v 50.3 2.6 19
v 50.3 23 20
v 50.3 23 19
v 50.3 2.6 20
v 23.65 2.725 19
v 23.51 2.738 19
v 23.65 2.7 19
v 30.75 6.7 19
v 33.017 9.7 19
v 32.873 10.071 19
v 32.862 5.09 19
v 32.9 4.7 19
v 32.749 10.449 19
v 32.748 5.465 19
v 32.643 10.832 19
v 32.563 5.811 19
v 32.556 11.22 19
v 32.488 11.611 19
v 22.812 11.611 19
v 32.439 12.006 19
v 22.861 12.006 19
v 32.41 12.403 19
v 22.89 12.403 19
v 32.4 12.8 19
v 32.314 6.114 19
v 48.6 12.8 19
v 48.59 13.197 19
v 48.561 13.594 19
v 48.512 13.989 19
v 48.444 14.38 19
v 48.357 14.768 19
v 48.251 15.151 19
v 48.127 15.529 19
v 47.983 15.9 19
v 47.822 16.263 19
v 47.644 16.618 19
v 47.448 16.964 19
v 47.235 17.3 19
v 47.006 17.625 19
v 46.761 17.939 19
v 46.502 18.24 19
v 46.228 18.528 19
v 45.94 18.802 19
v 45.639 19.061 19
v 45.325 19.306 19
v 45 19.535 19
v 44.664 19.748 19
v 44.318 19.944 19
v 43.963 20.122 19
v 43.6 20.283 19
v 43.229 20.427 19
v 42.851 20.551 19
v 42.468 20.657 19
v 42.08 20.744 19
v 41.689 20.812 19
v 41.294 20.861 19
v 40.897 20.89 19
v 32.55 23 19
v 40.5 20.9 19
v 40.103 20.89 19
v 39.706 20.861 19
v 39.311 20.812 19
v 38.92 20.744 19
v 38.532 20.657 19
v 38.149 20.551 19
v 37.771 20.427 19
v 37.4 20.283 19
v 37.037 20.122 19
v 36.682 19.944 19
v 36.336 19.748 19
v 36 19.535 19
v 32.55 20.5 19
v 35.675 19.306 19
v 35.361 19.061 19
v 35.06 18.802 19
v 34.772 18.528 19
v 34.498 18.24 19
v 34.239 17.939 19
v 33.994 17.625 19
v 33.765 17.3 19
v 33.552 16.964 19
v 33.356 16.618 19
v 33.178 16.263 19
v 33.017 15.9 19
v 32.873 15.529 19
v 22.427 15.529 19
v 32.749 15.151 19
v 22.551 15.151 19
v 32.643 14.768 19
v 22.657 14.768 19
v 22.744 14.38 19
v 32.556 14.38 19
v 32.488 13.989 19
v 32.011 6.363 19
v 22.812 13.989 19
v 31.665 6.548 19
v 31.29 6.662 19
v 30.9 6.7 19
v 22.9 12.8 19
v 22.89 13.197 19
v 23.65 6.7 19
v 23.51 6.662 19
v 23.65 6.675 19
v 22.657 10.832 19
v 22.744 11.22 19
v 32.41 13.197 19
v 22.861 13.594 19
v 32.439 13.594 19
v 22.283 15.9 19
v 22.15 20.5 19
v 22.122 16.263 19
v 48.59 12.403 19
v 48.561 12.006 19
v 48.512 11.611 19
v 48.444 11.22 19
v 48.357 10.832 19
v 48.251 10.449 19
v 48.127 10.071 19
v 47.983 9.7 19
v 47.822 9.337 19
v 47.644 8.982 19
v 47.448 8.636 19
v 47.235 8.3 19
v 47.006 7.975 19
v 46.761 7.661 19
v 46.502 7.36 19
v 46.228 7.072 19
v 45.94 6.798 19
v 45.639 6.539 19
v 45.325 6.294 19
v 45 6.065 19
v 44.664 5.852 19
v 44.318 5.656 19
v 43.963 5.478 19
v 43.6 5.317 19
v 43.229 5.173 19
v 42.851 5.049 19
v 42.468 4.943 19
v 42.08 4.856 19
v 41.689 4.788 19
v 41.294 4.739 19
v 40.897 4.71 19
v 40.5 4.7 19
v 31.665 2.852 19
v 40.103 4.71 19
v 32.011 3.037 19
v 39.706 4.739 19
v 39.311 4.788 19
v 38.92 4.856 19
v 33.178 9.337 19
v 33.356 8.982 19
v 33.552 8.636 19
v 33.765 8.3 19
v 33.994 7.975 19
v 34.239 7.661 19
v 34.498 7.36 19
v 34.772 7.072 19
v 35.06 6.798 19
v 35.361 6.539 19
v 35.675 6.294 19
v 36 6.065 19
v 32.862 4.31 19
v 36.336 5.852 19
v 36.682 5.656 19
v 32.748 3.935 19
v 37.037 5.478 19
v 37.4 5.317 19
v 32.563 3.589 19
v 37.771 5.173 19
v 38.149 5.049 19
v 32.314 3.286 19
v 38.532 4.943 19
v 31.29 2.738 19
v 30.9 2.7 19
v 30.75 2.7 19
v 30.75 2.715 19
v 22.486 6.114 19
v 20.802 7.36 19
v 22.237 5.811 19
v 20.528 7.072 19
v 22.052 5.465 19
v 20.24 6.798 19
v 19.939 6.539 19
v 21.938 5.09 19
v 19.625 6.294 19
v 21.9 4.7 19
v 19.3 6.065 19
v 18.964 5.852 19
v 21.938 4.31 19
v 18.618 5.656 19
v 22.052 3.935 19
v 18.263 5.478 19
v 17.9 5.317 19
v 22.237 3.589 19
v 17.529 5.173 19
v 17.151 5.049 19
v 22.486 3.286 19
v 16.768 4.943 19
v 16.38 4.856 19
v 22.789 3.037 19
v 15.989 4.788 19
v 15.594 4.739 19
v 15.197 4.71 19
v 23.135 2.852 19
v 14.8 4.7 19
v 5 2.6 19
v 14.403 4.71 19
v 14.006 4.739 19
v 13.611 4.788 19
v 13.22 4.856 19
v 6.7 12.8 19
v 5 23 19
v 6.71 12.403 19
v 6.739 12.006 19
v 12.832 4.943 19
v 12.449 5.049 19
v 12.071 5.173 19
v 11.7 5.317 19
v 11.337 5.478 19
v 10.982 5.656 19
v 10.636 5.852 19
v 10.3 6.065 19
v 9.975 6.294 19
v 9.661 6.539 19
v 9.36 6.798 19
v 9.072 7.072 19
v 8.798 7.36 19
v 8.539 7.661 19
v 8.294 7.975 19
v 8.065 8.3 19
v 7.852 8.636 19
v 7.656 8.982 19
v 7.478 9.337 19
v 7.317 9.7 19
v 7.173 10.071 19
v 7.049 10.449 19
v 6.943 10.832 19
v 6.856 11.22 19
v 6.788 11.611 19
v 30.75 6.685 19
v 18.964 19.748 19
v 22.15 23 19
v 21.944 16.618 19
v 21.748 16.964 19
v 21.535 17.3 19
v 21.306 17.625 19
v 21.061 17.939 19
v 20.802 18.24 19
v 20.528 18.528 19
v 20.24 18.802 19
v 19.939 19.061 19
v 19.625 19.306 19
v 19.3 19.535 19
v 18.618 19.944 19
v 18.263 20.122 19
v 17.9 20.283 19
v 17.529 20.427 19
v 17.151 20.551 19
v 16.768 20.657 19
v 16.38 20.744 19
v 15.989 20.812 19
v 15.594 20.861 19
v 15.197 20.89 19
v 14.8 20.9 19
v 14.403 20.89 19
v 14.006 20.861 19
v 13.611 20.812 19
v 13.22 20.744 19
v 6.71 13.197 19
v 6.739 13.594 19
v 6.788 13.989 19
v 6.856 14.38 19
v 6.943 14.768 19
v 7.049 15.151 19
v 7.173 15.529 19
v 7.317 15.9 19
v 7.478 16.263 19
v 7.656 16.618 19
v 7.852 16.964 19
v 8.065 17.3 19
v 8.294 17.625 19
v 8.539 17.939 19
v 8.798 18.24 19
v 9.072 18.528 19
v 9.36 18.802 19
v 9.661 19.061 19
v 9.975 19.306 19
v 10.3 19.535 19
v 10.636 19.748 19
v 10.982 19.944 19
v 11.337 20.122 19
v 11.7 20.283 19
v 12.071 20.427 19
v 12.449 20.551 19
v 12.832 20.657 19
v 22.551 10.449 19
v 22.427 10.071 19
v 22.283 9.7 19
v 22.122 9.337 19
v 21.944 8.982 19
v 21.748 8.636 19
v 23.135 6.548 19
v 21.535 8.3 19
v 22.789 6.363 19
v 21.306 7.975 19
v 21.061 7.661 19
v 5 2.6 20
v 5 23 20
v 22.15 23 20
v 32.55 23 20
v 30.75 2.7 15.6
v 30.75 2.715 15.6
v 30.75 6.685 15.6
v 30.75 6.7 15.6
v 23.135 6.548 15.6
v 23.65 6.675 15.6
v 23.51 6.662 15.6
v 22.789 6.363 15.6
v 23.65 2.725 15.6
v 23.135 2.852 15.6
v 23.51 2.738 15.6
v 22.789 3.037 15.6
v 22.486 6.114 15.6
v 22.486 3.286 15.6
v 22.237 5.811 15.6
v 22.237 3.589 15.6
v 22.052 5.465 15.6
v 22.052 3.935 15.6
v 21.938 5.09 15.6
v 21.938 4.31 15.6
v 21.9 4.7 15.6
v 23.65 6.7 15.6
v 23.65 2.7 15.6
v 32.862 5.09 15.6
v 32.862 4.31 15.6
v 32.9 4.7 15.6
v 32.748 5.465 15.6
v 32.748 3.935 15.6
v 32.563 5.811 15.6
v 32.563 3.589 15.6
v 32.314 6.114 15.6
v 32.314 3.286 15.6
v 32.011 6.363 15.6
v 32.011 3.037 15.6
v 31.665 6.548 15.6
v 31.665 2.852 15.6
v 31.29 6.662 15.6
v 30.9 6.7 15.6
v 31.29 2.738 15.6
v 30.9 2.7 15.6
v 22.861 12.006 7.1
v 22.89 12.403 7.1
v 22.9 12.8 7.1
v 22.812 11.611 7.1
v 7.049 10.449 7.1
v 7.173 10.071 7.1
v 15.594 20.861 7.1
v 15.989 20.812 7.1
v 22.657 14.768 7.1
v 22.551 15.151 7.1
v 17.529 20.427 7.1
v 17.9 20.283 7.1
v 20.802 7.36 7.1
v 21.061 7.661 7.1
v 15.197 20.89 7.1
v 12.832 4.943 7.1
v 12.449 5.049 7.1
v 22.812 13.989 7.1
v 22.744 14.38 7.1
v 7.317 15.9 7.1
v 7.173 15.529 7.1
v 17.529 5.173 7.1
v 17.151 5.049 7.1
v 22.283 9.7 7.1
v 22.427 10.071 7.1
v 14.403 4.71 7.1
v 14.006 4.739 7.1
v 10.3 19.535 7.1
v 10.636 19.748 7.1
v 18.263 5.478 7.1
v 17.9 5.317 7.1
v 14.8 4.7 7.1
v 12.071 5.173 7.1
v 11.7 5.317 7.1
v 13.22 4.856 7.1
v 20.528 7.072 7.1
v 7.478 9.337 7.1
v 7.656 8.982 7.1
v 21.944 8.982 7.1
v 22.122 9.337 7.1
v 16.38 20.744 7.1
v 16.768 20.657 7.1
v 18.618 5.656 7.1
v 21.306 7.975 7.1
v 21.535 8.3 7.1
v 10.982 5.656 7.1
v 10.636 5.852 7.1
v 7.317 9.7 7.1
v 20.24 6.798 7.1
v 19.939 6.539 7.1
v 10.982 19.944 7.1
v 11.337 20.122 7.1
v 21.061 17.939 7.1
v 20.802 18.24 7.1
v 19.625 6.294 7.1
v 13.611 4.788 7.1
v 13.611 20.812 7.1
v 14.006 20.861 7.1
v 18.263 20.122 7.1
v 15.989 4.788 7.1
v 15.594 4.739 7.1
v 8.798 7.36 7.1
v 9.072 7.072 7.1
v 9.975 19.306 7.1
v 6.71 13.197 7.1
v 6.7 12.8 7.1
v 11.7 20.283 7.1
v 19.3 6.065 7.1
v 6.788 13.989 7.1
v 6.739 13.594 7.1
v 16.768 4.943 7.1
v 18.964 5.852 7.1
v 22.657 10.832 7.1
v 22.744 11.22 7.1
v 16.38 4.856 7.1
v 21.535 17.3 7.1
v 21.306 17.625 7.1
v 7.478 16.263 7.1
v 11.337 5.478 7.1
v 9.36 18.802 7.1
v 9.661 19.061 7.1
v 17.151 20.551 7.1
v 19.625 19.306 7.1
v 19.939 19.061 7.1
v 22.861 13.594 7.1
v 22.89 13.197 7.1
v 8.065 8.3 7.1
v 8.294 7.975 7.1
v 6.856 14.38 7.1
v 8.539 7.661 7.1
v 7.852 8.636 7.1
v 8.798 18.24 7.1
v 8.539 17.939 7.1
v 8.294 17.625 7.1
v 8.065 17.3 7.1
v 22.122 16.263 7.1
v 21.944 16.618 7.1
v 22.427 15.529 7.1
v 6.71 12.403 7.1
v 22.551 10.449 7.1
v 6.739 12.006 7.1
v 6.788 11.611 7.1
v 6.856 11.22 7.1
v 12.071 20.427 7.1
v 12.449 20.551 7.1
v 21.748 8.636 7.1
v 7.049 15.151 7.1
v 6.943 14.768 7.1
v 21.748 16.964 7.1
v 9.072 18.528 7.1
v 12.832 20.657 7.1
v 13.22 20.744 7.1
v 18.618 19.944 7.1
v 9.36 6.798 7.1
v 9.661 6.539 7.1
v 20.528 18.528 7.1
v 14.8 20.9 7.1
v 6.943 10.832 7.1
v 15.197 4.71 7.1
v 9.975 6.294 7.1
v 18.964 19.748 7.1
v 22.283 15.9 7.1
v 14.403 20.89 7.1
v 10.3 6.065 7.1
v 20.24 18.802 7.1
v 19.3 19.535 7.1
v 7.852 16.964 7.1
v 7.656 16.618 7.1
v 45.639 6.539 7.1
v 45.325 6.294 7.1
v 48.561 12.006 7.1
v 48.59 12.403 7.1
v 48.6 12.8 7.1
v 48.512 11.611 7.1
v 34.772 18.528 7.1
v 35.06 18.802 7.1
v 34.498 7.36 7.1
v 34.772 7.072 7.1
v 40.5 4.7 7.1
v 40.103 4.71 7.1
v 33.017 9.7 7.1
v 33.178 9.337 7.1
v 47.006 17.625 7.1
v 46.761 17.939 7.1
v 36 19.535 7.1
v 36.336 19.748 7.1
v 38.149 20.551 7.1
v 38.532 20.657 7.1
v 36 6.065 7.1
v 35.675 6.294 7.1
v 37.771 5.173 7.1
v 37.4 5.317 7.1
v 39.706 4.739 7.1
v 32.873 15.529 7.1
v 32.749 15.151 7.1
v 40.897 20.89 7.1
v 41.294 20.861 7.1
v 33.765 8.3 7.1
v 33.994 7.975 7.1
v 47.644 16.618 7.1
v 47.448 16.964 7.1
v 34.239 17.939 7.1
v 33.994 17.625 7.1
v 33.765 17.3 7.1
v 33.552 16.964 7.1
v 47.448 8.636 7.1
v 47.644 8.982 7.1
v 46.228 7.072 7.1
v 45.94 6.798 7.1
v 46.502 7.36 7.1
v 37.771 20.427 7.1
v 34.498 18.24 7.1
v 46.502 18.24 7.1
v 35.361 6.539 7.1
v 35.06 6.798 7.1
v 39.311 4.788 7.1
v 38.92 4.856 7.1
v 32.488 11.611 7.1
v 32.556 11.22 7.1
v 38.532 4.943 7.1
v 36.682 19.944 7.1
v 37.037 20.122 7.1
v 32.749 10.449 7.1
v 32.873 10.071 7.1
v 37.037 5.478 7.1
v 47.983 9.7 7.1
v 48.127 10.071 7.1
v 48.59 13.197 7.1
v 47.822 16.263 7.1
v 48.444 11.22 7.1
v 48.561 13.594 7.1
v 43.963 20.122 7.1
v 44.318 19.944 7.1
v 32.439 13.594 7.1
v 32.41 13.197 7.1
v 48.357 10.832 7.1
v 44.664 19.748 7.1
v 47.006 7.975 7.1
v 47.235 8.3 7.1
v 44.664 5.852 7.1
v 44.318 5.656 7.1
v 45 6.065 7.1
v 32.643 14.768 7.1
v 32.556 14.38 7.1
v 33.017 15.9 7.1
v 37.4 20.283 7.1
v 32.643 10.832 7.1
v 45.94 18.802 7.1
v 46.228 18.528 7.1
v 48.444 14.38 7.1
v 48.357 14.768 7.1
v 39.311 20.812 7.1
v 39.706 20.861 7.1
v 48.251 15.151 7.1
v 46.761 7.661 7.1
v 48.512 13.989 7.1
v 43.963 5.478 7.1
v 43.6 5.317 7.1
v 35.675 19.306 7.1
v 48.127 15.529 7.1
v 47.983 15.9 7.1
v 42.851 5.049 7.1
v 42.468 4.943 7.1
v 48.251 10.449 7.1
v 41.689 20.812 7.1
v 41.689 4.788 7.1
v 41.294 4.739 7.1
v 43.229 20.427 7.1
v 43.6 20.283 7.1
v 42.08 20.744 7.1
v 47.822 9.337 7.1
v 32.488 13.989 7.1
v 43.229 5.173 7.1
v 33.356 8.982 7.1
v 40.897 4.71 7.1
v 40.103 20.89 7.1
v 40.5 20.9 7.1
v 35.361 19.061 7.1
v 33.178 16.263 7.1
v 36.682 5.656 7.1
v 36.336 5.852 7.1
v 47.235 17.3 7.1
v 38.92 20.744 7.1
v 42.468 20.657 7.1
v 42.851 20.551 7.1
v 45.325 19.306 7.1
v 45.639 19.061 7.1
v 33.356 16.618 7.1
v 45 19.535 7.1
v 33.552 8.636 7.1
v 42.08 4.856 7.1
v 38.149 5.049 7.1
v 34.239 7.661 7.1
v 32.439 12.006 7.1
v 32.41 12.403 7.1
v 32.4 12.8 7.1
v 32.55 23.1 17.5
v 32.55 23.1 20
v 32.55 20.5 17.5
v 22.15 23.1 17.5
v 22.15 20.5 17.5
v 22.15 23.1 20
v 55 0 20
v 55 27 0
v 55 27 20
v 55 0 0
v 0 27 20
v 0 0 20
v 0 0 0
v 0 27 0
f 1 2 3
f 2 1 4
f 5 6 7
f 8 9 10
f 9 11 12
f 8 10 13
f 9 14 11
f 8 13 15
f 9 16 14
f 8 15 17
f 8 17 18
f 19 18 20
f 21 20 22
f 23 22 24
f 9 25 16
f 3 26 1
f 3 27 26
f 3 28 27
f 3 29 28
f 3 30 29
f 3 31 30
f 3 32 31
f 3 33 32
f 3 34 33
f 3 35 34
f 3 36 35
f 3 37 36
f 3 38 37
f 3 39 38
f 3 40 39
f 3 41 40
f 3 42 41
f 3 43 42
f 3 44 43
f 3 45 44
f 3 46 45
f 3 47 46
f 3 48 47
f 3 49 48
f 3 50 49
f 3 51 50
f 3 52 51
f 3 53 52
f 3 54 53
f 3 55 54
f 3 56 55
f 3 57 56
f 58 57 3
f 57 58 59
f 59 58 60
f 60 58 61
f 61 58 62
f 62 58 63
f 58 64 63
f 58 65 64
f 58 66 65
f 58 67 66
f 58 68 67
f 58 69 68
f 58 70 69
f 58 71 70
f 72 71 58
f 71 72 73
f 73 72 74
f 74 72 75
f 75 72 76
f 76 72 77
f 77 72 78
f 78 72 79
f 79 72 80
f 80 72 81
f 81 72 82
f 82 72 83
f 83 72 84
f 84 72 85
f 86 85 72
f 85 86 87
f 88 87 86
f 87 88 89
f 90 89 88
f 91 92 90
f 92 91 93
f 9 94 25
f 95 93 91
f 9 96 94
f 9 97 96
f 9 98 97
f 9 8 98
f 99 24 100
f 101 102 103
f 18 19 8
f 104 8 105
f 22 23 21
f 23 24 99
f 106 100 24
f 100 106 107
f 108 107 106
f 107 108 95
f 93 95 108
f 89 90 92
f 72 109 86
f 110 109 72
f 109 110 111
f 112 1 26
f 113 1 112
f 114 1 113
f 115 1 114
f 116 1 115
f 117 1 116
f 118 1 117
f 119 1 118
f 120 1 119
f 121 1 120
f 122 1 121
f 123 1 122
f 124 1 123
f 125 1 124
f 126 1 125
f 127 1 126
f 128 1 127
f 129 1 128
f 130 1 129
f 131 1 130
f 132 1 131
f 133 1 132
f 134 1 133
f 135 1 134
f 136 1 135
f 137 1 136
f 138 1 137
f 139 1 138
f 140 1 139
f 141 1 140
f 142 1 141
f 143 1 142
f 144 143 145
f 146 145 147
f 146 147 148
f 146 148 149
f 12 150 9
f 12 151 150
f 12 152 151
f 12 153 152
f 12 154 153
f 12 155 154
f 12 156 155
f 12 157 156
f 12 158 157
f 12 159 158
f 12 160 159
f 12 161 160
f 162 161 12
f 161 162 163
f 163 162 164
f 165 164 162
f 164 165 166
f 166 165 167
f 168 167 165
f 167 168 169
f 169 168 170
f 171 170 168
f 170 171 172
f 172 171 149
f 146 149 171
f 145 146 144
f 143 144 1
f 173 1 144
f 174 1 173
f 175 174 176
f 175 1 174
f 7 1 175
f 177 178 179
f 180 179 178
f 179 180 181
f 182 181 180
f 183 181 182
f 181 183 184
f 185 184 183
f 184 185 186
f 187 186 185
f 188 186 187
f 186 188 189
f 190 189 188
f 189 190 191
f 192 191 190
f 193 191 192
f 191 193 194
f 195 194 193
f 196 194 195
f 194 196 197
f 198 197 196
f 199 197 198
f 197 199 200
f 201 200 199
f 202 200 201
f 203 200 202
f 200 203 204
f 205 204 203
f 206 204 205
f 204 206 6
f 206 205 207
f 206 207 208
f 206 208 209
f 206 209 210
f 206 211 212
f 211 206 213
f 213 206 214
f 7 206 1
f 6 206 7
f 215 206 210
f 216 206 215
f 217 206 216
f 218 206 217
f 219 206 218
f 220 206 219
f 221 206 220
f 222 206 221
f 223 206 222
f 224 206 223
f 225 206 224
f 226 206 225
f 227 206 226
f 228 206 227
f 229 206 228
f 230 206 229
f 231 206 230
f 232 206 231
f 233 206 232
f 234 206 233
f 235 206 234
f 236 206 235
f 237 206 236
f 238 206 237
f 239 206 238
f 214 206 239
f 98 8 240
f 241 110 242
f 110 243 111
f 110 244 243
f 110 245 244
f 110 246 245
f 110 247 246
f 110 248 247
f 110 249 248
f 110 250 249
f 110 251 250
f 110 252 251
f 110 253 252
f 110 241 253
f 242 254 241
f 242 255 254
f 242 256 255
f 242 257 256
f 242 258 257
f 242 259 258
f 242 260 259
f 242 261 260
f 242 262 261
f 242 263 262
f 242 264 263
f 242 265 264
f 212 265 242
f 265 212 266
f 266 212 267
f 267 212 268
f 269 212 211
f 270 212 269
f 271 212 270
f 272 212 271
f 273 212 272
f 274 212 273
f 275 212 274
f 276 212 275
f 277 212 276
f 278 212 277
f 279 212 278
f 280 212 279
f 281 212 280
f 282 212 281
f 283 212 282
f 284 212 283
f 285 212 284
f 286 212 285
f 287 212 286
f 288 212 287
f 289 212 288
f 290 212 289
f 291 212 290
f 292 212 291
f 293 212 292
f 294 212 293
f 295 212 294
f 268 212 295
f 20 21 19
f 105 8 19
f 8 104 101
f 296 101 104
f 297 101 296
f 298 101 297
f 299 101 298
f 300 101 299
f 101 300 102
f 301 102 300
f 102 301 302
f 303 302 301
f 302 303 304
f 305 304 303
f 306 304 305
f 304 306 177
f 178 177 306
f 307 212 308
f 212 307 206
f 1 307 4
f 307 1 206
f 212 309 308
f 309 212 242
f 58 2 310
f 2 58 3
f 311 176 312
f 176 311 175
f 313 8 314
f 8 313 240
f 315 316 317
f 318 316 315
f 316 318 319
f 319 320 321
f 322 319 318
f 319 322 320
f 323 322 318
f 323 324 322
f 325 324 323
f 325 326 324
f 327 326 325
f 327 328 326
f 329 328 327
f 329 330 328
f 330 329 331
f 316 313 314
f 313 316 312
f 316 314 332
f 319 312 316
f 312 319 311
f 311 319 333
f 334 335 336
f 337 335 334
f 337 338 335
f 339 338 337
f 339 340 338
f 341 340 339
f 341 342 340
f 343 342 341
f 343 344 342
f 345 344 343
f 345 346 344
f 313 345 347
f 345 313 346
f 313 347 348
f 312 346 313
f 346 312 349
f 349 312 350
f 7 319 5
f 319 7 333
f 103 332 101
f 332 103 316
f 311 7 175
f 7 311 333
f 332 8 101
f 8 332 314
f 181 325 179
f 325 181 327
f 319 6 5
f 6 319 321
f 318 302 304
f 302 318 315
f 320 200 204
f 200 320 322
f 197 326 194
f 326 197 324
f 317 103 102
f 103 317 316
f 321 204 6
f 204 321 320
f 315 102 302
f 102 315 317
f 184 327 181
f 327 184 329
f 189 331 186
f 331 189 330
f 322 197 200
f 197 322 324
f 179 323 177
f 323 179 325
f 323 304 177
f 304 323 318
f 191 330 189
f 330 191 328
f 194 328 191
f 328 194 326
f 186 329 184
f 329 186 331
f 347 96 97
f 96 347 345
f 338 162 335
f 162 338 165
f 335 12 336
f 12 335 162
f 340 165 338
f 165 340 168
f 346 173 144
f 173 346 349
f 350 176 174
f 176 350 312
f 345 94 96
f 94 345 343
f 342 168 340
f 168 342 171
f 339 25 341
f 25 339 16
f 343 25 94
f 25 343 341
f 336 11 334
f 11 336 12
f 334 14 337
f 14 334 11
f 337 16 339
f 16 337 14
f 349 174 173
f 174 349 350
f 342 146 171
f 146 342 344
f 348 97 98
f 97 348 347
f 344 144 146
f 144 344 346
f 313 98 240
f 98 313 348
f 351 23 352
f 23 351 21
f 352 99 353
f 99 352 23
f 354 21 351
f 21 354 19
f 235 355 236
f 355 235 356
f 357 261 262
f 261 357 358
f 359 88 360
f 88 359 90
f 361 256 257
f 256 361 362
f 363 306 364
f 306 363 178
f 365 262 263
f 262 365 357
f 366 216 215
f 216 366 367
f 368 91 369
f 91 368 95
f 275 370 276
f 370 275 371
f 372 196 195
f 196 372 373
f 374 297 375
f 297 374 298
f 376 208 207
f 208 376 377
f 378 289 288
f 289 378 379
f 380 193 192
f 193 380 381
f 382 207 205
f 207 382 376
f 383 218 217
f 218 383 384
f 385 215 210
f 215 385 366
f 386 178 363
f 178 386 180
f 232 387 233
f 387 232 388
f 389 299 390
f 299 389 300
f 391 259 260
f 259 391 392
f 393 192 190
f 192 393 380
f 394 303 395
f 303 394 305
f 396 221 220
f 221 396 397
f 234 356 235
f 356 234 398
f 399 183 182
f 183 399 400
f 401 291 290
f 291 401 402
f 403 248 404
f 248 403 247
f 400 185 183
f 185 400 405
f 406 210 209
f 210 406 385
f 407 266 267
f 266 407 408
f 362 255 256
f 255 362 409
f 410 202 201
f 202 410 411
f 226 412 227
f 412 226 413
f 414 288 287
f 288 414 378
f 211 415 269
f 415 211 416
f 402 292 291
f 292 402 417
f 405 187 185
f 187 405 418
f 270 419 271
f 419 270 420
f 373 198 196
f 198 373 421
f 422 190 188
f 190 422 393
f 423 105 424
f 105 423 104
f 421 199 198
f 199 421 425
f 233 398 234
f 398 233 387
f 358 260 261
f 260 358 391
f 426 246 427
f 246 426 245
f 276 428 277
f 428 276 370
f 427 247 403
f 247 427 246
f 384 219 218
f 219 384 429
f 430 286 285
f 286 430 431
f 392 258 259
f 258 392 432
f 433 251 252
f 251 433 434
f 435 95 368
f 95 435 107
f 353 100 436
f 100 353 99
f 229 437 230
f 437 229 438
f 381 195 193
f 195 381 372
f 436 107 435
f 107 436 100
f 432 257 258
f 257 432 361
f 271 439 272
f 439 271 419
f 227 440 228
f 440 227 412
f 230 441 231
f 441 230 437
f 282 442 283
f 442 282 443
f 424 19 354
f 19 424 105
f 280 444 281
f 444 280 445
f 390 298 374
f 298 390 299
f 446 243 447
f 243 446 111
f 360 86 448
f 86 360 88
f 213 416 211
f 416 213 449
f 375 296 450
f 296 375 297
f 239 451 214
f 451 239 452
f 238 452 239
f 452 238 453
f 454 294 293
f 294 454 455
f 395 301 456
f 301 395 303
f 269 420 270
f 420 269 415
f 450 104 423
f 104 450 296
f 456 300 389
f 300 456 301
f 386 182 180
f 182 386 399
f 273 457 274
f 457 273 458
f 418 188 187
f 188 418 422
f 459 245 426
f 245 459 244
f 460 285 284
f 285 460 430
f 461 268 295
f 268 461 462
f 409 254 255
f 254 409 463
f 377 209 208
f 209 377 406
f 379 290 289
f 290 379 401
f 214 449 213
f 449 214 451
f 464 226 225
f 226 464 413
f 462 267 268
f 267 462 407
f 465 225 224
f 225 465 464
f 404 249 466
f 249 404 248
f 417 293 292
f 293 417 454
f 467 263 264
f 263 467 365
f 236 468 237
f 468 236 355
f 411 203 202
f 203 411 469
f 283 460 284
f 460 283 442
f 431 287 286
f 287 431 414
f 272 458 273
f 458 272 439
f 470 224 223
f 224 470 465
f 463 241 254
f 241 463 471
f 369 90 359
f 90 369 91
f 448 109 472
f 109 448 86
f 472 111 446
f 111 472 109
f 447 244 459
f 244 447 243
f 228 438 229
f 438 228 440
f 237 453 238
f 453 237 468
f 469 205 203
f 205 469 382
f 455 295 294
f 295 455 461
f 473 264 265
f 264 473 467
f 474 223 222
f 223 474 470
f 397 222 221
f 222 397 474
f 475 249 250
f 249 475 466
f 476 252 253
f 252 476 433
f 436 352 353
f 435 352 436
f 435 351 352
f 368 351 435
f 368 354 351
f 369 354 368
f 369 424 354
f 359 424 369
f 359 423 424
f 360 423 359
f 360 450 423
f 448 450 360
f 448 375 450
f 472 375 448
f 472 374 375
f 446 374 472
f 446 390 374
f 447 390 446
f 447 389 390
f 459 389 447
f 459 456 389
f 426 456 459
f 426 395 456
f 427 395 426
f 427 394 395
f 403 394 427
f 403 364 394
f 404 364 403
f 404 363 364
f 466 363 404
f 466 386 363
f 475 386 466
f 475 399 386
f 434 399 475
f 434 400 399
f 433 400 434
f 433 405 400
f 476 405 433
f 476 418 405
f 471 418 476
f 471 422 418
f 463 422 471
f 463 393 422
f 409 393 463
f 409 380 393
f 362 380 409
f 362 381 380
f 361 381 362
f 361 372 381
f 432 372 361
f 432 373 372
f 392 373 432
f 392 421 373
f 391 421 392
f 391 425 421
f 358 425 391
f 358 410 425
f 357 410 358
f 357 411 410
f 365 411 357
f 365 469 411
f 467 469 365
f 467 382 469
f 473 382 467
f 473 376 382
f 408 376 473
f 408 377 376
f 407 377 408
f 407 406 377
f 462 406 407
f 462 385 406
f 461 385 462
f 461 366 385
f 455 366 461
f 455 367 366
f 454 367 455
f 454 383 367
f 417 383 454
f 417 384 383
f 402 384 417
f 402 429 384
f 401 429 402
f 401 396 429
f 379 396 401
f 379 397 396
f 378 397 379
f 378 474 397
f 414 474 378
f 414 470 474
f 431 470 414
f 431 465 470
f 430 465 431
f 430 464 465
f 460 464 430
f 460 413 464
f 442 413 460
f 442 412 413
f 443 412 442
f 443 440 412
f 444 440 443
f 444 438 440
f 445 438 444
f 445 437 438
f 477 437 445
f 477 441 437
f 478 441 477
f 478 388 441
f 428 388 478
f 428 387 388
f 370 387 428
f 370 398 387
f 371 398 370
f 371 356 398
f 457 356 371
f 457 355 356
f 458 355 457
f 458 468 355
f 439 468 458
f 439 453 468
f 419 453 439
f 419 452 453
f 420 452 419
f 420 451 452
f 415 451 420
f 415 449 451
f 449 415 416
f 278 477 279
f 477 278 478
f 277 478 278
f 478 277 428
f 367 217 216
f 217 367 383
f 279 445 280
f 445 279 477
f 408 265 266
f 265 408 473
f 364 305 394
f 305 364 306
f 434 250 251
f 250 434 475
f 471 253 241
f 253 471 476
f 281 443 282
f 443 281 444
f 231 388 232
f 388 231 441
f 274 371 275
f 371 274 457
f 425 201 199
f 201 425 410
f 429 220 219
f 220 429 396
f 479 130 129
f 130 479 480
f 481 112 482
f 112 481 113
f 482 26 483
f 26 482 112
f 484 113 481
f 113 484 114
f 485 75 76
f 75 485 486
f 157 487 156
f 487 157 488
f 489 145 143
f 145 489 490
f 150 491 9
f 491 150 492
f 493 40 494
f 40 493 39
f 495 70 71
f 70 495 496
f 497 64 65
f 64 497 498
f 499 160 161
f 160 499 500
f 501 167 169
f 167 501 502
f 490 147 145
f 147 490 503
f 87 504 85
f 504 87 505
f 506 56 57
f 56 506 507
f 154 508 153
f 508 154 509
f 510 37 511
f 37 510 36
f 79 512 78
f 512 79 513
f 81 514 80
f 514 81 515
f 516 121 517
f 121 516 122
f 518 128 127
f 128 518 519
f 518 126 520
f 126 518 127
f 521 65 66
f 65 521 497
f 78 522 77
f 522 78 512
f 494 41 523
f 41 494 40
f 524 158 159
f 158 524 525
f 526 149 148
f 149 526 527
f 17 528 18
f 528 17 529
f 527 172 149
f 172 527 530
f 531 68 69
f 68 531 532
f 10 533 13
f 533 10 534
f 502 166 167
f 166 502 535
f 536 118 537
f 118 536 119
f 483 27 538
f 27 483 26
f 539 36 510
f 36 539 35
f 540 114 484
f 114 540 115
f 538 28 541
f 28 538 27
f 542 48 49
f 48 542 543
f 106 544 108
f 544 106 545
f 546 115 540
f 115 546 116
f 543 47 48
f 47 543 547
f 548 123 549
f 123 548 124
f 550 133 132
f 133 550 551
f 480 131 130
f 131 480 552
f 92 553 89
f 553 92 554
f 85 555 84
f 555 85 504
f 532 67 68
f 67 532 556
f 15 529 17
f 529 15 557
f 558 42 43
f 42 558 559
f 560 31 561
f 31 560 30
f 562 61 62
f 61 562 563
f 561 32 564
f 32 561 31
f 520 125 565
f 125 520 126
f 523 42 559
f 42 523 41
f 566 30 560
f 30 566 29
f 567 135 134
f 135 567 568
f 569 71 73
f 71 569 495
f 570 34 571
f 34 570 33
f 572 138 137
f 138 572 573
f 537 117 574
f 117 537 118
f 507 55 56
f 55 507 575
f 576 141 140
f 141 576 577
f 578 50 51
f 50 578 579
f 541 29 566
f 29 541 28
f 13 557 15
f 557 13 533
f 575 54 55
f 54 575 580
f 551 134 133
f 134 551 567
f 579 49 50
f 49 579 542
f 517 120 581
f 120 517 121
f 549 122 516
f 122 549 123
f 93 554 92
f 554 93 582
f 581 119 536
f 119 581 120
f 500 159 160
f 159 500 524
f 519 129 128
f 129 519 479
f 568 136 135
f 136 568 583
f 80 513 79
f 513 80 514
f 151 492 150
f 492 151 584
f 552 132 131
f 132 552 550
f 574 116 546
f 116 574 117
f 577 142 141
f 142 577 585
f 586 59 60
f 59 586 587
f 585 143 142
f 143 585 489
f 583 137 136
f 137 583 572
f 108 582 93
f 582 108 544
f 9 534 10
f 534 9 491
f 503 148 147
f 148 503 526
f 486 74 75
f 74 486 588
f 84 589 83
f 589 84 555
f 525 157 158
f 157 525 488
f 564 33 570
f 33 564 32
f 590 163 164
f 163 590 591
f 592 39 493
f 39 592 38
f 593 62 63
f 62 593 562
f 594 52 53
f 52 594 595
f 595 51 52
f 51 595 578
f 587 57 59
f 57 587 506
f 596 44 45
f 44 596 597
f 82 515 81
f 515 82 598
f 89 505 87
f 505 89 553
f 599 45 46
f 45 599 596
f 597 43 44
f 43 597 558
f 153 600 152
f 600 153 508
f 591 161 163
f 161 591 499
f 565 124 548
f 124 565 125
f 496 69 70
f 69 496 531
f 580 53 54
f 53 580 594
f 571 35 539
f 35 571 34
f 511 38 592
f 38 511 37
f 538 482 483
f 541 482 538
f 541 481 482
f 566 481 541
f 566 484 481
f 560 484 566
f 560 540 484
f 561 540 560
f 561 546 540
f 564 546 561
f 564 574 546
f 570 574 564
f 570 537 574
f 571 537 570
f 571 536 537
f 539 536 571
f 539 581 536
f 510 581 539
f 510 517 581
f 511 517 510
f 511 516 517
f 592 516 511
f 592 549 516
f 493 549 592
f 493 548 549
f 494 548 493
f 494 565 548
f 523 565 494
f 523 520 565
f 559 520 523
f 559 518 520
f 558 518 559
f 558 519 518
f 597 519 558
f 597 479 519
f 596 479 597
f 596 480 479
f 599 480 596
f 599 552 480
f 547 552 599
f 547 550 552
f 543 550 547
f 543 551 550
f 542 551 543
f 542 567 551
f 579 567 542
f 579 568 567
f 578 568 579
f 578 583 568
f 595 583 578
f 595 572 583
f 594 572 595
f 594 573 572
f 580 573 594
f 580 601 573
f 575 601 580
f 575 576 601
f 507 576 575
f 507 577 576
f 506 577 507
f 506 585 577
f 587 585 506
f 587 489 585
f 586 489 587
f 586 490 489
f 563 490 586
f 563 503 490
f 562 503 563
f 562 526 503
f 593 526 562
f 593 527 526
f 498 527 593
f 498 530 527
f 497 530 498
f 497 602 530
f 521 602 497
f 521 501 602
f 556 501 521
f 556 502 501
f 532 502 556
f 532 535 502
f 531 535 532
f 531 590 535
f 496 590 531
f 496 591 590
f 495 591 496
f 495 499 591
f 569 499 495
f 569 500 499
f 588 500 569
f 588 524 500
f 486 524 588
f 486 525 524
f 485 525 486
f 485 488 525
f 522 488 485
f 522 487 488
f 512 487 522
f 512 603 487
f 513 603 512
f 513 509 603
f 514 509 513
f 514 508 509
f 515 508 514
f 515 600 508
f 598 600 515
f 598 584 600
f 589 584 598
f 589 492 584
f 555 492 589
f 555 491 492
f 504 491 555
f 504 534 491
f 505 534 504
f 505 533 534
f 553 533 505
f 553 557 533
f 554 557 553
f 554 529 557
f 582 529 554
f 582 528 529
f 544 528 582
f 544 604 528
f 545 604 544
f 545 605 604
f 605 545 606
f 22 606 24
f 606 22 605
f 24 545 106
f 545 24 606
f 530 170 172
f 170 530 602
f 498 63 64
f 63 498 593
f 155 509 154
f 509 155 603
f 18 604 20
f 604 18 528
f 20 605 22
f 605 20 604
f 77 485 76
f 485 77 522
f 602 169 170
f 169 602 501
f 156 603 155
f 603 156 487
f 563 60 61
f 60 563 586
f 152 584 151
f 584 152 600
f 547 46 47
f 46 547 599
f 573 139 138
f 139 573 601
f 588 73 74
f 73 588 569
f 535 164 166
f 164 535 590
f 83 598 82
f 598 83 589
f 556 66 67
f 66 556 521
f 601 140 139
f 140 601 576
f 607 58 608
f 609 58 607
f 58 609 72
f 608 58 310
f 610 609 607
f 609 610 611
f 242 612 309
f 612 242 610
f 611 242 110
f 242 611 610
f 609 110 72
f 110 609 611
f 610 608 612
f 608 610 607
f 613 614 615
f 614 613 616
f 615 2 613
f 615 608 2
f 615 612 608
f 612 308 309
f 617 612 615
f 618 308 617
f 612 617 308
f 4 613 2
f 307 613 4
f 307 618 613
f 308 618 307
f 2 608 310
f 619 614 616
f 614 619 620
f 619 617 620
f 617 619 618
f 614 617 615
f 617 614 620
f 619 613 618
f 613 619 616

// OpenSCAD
// file: distanceSensorHC-SR04.scad
module distanceSensorHC_SR04(thickness=0) {
    union() {
        color("SteelBlue") {
            cube([45.3, 20.4, 4]);

            translate([0, 0, -thickness + 0.1]) 
                cube([45.3, 20.4, thickness]);
        }
            
        // Left sensor
        translate([2 + 8 - 0.2, 20.4/2, 3.9]) {
            color("Silver") {
                cylinder(r=8.1, h=12);
            }
        }

        // Right sensor
        translate([45.3 - 2 - 8 + 0.2, 20.4/2, 3.9]) {
            color("Silver") {
                cylinder(r=8.1, h=12);
            }
        }

        color("LightGrey") {
            translate([45.3/2 - 7 + 1.5, 20.4 - 3.5 - 0.6, 3.9]) {
                union() { // top clock
                    translate([1.5, 0, 0])
                        cube([7.1, 4, 3.5]);

                    translate([3.5/2, 3.5/2 + 0.25, 0])
                        cylinder(r=2, h=3.5);

                    translate([3.5/2 + 7, 3.5/2 + 0.25, 0])
                        cylinder(r=2, h=3.5);
                }
            }
        }
        color("DimGray")
            translate([45.3/2 - 7 + 1.5, -0.1, -4.3+2.5])
                cube(size=[10.4, 2.6, 7.3]);
    }
}
// main file
include <distanceSensorHC-SR04.scad>

$fa = 1;
$fs = 0.4;

difference() {
    cube([55, 27, 20]);

    rotate([180, 0, 0])
        translate([5, -23, -23])
            distanceSensorHC_SR04(3);
}
